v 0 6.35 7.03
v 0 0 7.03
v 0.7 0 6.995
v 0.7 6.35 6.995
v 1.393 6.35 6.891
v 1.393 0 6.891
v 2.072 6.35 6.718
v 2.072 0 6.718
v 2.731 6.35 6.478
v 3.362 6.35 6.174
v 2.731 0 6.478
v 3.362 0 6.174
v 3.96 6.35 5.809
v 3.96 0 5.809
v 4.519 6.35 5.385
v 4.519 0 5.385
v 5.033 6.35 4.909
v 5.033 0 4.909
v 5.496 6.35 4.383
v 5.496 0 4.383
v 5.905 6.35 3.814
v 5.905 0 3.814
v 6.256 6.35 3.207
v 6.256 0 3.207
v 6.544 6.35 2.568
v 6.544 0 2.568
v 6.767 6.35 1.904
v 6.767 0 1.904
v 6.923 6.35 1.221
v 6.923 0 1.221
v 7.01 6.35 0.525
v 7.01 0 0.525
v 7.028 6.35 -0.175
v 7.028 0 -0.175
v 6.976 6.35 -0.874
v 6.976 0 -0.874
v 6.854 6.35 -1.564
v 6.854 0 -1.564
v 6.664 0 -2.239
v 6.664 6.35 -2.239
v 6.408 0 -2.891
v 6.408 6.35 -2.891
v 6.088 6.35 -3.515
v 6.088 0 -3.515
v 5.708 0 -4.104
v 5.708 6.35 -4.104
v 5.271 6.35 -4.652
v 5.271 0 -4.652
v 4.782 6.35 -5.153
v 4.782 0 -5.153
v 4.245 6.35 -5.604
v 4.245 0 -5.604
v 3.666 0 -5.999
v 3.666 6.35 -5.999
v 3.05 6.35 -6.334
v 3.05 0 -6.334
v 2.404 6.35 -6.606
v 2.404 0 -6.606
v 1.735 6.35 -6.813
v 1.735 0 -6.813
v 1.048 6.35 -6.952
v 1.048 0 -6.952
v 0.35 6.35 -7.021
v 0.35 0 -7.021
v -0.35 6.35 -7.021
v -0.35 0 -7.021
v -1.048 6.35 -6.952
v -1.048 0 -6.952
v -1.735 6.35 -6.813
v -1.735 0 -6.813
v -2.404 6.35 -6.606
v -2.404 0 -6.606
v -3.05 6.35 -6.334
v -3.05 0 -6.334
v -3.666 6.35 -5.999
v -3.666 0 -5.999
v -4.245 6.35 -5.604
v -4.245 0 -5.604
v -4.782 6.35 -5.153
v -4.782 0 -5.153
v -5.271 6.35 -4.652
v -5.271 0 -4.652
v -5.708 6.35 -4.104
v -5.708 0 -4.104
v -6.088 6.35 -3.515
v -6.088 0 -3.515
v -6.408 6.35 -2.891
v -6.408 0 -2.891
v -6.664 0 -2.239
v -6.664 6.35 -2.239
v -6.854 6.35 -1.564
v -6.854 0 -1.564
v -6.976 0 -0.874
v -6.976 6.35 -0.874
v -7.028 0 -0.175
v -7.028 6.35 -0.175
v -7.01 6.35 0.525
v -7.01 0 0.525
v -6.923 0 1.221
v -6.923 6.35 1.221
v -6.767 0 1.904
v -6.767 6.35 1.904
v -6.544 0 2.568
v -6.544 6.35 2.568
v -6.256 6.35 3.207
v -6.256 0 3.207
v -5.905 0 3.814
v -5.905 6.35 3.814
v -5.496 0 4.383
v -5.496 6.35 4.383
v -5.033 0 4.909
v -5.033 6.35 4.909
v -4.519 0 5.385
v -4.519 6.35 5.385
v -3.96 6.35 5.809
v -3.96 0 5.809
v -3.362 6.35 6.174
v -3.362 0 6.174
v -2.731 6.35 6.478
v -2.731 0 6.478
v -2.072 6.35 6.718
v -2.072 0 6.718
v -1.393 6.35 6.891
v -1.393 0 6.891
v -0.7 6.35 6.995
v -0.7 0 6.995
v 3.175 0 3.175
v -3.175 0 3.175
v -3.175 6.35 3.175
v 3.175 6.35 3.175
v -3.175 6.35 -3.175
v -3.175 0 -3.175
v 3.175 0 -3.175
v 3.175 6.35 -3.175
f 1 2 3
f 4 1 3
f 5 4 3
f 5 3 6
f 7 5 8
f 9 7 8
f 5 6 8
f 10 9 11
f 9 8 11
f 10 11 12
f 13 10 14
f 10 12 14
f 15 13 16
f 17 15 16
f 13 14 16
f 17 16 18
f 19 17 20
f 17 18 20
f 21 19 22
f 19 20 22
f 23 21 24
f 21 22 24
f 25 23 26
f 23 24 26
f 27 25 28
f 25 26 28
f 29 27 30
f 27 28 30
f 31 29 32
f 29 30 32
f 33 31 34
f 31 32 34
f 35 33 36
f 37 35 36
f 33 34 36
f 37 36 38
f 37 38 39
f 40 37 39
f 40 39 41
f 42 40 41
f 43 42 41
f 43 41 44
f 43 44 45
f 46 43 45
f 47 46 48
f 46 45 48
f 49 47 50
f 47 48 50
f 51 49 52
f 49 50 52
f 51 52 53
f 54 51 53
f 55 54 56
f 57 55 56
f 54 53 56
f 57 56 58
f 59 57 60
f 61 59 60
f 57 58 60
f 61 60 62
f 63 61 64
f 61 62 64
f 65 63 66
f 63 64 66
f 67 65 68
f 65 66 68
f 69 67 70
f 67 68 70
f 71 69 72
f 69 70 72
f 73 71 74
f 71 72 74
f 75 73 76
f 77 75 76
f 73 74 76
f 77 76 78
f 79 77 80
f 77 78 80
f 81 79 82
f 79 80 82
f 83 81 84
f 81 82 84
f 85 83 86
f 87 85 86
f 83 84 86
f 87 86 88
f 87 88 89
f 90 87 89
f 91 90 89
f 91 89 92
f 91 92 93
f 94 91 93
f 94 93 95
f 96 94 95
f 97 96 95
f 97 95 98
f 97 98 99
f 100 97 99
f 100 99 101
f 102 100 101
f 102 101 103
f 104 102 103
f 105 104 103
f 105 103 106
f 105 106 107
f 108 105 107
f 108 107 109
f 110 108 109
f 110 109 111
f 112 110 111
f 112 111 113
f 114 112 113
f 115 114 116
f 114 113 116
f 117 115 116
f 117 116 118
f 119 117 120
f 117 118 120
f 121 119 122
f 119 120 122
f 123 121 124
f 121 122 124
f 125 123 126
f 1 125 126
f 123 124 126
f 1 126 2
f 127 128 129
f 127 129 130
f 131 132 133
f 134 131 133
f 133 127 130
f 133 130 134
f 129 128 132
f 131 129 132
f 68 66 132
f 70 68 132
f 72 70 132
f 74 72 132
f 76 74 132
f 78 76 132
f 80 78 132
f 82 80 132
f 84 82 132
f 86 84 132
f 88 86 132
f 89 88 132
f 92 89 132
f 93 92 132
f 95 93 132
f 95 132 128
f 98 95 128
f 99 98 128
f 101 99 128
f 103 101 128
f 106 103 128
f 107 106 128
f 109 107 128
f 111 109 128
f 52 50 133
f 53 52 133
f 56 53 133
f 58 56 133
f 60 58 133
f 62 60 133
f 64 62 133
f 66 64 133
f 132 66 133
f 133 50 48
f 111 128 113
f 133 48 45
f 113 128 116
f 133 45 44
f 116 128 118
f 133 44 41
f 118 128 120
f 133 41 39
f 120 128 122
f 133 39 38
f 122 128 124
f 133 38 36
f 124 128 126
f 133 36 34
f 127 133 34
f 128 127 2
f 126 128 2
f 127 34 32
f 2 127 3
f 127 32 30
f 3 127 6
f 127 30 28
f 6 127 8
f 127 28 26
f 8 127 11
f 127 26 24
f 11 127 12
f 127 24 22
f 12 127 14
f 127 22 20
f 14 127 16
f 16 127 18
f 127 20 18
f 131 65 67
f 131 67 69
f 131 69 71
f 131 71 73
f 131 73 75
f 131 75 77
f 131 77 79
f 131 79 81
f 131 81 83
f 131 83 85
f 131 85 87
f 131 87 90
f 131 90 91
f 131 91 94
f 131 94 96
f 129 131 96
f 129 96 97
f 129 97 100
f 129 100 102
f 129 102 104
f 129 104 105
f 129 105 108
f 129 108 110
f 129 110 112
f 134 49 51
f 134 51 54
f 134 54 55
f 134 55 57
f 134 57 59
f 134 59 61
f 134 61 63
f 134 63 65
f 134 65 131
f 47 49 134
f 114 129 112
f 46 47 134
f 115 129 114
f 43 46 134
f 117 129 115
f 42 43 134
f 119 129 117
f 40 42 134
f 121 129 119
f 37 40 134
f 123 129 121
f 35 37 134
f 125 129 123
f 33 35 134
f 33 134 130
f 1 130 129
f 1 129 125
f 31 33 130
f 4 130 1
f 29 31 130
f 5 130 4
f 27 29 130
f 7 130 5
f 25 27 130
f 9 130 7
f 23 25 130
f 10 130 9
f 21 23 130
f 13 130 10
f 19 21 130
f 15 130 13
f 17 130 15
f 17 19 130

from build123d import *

# Parameters (mm, degrees)
ELEVATOR_AXLE_BEARING_R = 7.030128061
ELEVATOR_AXLE_BEARING_W = 6.35
ELEVATOR_AXLE_BEARING_H = 6.35
BOSS_EXTRUDE1_DEPTH     = 6.35


with BuildPart() as part:
    # Elevator Axle Bearing → Boss-Extrude1 (new body)
    with BuildSketch(Plane(origin=(0, 0, 0), x_dir=(1, 0, 0), z_dir=(0, 1, 0))):
        with Locations(Location((0, 0, 0), (0, 0, 270))):
            Circle(ELEVATOR_AXLE_BEARING_R)
        Rectangle(ELEVATOR_AXLE_BEARING_W, ELEVATOR_AXLE_BEARING_H, mode=Mode.SUBTRACT)
    extrude(amount=BOSS_EXTRUDE1_DEPTH)


solid = part.part
